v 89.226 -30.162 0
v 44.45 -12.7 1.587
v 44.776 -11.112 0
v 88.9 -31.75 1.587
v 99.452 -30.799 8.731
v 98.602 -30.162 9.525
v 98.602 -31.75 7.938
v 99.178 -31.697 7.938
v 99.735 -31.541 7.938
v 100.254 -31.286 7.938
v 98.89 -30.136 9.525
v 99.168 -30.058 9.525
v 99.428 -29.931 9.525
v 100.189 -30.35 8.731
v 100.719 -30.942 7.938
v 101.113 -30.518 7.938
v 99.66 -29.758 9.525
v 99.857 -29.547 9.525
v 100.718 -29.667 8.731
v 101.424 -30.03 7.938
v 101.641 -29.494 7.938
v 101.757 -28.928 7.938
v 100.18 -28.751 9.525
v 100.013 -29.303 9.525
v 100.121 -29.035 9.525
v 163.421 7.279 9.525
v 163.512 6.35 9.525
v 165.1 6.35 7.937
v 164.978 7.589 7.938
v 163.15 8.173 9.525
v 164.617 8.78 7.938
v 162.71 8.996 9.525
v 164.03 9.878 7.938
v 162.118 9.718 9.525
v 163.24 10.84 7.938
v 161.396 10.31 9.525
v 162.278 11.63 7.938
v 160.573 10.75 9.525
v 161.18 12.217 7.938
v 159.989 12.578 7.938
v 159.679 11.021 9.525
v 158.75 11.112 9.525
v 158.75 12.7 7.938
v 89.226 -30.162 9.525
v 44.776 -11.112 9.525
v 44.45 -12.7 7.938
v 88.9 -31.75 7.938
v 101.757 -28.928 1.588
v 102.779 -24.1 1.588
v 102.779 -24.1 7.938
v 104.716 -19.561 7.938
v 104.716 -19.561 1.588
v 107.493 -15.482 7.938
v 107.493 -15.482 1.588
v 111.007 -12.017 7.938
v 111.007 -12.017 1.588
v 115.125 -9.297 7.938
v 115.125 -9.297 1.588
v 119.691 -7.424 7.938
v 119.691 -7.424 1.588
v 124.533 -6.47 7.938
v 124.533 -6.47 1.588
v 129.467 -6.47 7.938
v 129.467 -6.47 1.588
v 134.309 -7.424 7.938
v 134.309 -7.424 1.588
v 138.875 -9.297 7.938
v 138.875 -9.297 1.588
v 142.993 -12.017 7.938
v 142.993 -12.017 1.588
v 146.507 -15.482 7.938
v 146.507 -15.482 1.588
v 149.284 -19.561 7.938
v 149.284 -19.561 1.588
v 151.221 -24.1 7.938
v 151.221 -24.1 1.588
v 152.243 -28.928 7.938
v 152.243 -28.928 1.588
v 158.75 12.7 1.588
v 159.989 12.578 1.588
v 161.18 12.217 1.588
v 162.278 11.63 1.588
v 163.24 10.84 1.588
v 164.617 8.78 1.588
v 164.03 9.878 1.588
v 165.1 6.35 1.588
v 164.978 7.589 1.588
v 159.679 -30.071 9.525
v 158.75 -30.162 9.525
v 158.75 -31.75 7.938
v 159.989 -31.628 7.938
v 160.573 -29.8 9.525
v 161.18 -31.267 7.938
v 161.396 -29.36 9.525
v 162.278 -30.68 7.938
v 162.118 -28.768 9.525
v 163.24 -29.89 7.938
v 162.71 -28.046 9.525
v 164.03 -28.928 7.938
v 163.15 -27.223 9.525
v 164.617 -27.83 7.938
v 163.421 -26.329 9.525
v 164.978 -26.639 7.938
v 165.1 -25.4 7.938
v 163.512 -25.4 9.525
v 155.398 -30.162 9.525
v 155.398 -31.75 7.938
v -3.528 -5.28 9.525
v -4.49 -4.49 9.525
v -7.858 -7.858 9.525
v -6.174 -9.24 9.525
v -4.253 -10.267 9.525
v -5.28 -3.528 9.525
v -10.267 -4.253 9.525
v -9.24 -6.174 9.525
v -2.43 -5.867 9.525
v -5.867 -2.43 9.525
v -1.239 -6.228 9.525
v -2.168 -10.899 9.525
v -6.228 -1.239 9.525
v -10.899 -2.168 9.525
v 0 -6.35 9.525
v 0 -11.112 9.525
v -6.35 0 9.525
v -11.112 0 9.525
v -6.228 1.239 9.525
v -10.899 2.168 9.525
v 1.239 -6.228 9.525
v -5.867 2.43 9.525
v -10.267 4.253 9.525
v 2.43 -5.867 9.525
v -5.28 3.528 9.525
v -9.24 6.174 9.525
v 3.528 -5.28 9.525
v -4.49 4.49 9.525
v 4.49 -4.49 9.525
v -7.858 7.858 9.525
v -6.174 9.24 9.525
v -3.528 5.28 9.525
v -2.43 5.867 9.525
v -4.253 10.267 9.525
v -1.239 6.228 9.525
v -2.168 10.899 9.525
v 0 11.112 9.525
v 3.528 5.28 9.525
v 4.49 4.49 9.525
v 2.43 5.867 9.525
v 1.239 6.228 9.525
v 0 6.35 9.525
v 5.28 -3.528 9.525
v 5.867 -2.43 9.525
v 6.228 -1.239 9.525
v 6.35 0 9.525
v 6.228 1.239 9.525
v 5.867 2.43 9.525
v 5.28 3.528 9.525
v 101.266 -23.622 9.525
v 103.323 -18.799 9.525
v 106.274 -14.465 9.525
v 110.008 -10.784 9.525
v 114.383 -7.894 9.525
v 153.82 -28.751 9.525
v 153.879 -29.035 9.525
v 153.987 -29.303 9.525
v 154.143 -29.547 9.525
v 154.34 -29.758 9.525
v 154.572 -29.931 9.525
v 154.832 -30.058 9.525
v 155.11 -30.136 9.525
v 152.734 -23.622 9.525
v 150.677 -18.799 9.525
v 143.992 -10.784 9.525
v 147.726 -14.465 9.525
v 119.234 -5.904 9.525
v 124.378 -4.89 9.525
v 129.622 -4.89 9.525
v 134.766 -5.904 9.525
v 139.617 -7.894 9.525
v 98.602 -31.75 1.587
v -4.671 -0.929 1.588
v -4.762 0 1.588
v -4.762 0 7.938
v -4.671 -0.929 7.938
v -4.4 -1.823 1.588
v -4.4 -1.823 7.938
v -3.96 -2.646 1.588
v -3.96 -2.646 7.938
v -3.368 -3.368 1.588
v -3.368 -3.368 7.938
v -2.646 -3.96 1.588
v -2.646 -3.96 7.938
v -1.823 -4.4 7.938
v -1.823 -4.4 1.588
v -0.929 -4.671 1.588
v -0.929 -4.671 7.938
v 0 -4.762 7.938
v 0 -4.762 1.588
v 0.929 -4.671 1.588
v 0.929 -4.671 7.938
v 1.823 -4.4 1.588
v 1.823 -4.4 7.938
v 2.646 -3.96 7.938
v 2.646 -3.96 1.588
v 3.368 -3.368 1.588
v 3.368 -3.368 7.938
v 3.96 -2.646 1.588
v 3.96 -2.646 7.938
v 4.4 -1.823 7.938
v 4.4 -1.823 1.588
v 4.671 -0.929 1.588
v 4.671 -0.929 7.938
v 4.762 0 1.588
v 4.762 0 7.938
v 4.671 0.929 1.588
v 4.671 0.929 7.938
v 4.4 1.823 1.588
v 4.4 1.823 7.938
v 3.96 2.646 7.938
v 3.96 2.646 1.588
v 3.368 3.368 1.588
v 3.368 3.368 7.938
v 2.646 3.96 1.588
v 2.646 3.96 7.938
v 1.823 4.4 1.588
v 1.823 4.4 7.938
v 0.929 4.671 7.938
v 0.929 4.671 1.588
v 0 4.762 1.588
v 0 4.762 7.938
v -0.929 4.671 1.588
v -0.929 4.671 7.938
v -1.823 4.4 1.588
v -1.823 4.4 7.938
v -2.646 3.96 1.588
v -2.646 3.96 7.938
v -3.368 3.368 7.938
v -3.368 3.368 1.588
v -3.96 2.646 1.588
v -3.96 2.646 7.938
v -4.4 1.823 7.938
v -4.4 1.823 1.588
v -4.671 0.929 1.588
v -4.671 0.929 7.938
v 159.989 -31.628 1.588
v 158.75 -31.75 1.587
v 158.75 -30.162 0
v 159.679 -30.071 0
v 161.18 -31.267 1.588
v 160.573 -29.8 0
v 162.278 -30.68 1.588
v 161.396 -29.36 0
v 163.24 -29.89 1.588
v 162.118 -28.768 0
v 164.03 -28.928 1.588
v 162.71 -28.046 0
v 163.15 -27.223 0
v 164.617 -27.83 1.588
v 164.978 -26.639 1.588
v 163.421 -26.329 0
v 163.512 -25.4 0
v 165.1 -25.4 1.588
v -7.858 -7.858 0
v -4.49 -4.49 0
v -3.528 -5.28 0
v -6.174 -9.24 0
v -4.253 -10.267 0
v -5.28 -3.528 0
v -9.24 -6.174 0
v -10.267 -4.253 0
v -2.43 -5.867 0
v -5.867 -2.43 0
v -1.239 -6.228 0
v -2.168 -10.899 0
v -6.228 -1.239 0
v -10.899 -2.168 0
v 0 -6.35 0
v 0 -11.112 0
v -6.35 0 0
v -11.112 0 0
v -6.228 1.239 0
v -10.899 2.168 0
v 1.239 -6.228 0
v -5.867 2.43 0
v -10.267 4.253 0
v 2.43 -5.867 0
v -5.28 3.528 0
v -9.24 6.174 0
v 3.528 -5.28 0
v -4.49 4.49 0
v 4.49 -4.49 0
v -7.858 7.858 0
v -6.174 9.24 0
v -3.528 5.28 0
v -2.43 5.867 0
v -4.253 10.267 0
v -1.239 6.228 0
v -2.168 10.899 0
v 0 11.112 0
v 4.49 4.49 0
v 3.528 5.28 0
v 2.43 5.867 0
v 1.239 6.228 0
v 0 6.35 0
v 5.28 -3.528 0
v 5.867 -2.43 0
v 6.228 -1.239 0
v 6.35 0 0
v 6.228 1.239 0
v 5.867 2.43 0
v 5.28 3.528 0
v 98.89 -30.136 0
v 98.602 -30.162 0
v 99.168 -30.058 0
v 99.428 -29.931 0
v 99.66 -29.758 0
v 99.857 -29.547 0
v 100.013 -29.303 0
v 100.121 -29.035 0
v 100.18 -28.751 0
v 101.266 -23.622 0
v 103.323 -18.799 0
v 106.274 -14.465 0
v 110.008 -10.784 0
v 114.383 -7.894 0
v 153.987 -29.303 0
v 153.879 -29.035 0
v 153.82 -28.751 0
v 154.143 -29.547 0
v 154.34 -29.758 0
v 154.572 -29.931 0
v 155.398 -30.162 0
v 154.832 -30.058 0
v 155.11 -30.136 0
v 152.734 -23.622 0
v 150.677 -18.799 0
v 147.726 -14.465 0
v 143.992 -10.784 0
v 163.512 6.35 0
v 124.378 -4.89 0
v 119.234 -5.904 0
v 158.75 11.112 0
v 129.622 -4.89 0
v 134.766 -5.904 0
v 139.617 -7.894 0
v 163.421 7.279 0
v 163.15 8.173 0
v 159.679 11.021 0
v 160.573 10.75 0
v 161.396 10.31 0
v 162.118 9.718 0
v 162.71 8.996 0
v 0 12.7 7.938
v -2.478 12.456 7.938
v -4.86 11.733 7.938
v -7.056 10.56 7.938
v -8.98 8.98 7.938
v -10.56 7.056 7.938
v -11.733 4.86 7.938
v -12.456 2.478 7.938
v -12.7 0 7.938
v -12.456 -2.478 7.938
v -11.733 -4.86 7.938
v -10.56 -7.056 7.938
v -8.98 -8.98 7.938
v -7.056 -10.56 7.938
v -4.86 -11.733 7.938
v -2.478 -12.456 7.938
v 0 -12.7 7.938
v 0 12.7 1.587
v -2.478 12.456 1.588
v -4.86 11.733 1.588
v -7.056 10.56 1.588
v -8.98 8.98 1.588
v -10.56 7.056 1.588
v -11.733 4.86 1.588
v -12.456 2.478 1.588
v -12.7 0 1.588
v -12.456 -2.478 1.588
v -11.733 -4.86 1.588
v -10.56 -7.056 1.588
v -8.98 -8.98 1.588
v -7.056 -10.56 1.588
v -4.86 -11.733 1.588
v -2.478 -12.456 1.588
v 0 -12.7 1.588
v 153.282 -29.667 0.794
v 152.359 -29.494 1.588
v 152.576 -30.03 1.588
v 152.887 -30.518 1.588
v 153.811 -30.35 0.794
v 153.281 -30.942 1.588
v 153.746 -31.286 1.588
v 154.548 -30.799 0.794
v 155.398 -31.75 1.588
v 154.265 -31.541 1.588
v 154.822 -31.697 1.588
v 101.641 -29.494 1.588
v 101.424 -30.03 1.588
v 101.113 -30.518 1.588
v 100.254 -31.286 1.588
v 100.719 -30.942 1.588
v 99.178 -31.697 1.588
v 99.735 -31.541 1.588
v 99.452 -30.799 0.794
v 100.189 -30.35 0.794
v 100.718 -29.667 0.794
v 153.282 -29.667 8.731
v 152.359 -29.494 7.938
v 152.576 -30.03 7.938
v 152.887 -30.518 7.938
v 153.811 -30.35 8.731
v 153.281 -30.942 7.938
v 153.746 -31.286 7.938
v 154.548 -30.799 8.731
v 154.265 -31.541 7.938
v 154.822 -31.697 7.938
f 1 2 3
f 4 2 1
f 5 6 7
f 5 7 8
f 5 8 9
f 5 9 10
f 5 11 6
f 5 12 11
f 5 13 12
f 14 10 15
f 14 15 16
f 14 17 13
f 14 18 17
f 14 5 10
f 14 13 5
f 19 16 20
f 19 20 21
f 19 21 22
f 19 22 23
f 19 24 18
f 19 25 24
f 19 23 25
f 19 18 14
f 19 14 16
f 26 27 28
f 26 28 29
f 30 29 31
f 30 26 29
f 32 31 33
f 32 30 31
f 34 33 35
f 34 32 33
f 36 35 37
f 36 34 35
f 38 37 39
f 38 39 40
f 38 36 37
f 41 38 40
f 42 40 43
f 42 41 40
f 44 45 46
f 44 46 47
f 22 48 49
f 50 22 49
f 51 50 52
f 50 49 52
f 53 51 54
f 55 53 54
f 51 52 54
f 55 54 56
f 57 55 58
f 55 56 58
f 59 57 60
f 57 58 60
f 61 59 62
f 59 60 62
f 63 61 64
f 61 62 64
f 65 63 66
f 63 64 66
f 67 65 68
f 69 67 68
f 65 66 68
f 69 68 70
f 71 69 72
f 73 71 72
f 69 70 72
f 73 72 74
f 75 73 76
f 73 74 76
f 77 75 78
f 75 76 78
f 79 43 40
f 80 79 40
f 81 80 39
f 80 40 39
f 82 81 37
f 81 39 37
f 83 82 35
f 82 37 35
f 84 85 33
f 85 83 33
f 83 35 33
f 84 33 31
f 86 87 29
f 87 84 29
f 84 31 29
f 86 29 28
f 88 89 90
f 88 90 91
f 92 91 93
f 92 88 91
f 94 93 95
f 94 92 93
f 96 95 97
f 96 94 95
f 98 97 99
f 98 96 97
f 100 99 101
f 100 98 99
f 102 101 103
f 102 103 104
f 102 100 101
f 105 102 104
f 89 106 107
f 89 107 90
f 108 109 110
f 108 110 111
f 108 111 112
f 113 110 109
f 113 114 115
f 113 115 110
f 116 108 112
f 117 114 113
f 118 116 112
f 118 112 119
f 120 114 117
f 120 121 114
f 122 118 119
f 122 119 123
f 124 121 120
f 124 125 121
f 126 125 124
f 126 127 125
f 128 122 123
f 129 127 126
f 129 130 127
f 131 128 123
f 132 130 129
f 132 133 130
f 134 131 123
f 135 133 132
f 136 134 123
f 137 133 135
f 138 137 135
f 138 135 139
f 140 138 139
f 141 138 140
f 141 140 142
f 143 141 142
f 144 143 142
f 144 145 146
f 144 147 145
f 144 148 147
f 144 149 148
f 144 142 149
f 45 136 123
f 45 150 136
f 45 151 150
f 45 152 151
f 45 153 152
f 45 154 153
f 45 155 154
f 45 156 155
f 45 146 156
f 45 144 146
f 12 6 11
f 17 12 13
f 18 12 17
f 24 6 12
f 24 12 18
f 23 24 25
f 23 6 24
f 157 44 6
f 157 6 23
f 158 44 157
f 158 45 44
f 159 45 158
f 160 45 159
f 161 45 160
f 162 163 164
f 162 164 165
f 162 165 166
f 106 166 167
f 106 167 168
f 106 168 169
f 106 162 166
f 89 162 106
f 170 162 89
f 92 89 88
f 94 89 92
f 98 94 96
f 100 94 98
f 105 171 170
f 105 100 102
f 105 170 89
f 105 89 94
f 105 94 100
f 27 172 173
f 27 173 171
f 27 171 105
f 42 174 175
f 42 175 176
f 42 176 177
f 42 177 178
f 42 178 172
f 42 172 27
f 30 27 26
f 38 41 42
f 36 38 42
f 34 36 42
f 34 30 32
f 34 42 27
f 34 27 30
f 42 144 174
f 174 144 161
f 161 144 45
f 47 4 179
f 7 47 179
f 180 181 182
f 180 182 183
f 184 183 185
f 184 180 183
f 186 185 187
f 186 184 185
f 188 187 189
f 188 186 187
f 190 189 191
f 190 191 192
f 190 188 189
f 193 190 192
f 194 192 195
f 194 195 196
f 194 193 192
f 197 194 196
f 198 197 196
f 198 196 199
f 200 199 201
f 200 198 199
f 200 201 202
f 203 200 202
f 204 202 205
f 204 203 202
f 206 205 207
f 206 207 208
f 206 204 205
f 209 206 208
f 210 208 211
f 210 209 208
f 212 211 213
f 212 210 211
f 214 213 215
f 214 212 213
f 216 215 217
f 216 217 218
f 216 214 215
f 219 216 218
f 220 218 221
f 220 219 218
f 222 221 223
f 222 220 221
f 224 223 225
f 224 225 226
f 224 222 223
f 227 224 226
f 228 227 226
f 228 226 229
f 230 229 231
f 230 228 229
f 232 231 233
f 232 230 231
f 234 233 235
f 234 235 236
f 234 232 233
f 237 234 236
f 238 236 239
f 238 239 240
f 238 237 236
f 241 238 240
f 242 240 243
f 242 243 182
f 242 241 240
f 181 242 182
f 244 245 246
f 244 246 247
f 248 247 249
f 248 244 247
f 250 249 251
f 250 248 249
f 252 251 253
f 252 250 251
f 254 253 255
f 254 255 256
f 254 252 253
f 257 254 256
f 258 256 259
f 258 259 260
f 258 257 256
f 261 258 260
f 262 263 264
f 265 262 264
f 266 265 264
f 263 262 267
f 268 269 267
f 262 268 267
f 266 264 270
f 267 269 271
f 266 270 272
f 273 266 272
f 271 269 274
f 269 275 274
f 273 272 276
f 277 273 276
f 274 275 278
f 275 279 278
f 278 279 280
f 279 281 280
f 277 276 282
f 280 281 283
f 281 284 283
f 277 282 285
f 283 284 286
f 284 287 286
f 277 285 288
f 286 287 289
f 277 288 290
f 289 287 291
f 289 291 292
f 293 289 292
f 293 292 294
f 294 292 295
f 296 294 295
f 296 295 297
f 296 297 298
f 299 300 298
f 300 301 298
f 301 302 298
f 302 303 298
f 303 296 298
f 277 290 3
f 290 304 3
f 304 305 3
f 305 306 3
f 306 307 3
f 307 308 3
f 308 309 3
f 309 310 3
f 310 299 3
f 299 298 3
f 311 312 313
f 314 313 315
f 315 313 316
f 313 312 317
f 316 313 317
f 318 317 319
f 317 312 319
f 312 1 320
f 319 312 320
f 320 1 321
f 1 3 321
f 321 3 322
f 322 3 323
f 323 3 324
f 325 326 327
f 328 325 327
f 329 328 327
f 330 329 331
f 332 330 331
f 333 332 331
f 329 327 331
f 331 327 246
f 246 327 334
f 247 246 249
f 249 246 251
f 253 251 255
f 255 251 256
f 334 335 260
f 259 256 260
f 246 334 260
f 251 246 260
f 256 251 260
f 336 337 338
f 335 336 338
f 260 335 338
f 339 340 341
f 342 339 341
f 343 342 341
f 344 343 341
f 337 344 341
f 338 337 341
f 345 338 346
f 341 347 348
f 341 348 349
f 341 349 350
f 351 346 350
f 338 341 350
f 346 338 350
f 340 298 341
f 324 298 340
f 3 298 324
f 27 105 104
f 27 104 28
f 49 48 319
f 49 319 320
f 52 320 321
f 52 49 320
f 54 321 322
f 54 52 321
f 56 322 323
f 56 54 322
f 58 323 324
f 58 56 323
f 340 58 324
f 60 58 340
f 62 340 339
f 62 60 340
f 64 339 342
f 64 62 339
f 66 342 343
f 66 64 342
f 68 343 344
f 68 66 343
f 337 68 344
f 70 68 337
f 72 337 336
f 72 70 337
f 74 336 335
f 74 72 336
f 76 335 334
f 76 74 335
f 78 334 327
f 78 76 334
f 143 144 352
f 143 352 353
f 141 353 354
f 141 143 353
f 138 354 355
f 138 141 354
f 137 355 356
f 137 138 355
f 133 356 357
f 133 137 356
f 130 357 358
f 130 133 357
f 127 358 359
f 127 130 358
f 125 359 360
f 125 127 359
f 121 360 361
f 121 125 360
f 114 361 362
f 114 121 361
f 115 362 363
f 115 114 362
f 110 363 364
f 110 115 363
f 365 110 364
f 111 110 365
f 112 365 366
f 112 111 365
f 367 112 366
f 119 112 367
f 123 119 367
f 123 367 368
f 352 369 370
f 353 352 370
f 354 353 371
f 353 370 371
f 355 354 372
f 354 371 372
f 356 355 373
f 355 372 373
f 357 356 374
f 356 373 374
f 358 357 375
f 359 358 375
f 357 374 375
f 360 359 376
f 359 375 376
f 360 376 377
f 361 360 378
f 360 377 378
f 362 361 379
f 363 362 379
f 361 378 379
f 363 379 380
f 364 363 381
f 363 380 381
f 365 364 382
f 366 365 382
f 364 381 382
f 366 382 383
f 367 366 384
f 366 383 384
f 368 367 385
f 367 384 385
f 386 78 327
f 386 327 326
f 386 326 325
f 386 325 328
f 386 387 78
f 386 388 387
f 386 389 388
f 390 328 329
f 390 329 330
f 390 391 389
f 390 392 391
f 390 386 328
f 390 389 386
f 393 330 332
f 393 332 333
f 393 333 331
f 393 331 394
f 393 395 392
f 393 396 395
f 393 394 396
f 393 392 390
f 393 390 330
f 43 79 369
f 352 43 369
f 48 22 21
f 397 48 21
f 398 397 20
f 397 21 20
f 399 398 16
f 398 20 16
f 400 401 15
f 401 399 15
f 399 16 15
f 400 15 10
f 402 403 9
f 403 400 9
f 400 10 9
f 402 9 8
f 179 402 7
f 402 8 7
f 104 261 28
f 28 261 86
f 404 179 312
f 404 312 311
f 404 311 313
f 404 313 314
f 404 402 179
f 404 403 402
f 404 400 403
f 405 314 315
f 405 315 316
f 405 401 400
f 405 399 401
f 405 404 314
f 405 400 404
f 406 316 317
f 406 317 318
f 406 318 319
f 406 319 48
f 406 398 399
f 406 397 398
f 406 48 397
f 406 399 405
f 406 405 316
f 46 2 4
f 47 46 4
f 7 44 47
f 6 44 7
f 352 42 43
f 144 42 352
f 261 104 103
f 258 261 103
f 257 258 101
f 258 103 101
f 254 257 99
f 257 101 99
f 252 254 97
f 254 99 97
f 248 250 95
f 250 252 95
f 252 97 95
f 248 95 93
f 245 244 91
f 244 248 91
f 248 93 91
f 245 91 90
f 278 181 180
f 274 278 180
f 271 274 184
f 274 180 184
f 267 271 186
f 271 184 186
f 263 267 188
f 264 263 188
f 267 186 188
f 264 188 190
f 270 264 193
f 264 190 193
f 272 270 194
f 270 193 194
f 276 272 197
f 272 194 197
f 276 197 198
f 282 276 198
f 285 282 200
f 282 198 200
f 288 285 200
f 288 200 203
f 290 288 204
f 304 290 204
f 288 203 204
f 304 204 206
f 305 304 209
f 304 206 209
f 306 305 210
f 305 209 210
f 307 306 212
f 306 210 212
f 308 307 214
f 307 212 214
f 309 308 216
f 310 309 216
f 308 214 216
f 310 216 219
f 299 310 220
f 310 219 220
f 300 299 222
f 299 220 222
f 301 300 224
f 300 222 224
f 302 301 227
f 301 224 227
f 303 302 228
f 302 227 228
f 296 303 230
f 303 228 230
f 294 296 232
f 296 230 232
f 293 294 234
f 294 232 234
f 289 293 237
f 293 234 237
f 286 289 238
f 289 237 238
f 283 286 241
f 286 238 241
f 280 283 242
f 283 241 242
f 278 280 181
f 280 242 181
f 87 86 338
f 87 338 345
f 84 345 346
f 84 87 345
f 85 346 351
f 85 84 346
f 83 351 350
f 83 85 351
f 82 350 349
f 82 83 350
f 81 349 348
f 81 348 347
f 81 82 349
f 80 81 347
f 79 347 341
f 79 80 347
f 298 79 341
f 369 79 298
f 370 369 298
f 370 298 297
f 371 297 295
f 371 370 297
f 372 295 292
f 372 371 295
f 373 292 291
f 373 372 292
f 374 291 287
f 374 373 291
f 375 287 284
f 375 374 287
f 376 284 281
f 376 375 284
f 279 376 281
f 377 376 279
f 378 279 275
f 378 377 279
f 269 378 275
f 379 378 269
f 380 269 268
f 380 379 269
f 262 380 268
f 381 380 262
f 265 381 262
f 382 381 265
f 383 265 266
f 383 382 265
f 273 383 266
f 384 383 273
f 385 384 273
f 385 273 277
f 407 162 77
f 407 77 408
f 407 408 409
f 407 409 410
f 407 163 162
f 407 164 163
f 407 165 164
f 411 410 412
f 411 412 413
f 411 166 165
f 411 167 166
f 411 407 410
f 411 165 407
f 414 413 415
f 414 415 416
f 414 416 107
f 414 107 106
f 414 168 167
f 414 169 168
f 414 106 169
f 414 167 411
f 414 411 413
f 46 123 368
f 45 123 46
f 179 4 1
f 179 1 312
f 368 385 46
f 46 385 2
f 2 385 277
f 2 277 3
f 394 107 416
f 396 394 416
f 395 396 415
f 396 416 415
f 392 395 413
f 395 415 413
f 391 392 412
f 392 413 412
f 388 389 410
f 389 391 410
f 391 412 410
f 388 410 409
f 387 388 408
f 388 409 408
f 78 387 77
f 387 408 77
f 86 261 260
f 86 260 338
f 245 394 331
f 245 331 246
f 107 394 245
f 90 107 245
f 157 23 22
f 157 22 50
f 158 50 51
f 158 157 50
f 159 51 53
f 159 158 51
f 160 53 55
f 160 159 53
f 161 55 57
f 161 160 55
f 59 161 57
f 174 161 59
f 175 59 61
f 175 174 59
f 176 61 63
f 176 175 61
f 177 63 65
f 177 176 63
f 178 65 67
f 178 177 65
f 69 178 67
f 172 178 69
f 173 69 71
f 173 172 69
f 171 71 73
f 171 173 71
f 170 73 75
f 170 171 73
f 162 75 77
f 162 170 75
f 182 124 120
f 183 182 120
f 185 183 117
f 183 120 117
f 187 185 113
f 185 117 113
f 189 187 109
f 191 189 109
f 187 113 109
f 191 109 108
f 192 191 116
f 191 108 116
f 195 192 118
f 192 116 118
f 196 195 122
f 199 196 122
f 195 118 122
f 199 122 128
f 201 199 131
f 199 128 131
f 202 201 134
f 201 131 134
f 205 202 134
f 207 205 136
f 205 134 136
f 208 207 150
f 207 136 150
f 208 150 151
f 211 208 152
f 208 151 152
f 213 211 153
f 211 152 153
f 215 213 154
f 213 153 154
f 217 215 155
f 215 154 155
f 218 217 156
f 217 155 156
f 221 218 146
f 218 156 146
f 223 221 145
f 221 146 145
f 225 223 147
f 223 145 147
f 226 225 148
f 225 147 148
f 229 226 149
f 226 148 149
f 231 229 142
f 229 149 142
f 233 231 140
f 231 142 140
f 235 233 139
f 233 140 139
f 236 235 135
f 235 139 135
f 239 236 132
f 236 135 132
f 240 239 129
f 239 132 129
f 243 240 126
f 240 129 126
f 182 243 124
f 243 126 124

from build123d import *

# Parameters (mm, degrees)
SKETCH1_R           = 12.7
SKETCH1_R_2         = 4.7625
BOSS_EXTRUDE1_DEPTH = 9.525
FILLET1_R           = 6.35
FILLET2_R           = 3.175
CHAMFER1_SIZE       = 1.5875


with BuildPart() as part:
    # Sketch1 → Boss-Extrude1 (new body)
    # profile 1 of 2: a face of its own
    with BuildSketch(Plane.XY):
        with BuildLine():
            Line((165.1, 12.7), (0, 12.7))
            ThreePointArc((0, 12.7), (8.980256121, 8.980256121), (12.7, 0))
            ThreePointArc((12.7, 0), (8.980256121, -8.980256121), (0, -12.7))
            Line((0, -12.7), (44.45, -12.7))
            Line((44.45, -12.7), (88.9, -31.75))
            Line((88.9, -31.75), (101.6, -31.75))
            ThreePointArc((101.6, -31.75), (127, -6.35), (152.4, -31.75))
            Line((152.4, -31.75), (165.1, -31.75))
            Line((165.1, -31.75), (165.1, 12.7))
        make_face()
    # profile 2 of 2: a face of its own
    with BuildSketch(Plane.XY):
        Circle(SKETCH1_R)
        with Locations(Location((0, 0, 0), (0, 0, 180))):
            Circle(SKETCH1_R_2, mode=Mode.SUBTRACT)
    extrude(amount=BOSS_EXTRUDE1_DEPTH)

    # Fillet1
    fillet1_edges = [part.edges().sort_by_distance(p)[0] for p in [
        (165.1, 12.7, 4.7625),
        (165.1, -31.75, 4.7625),
    ]]
    fillet(fillet1_edges, radius=FILLET1_R)

    # Fillet2
    fillet2_edges = [part.edges().sort_by_distance(p)[0] for p in [
        (101.6, -31.75, 4.7625),
        (152.4, -31.75, 4.7625),
    ]]
    fillet(fillet2_edges, radius=FILLET2_R)

    # Chamfer1
    chamfer1_edges = [part.edges().sort_by_distance(p)[0] for p in [
        (93.750968343, -31.75, 0),
        (66.675, -22.225, 0),
        (22.225, -12.7, 0),
        (-12.7, 0, 0),
        (79.375, 12.7, 0),
        (79.375, 12.7, 9.525),
        (-12.7, 0, 9.525),
        (22.225, -12.7, 9.525),
        (66.675, -22.225, 9.525),
        (165.1, -9.525, 0),
        (165.1, -9.525, 9.525),
        (157.074031657, -31.75, 0),
        (163.240128061, 10.840128061, 0),
        (93.750968343, -31.75, 9.525),
        (163.240128061, -29.890128061, 0),
        (157.074031657, -31.75, 9.525),
        (163.240128061, 10.840128061, 9.525),
        (163.240128061, -29.890128061, 9.525),
        (4.7625, 0, 9.525),
        (127, -6.35, 0),
        (100.718603352, -30.941505276, 0),
        (153.281396648, -30.941505276, 0),
        (127, -6.35, 9.525),
        (100.718603352, -30.941505276, 9.525),
        (153.281396648, -30.941505276, 9.525),
        (4.7625, 0, 0),
    ]]
    chamfer(chamfer1_edges, length=CHAMFER1_SIZE)


solid = part.part
